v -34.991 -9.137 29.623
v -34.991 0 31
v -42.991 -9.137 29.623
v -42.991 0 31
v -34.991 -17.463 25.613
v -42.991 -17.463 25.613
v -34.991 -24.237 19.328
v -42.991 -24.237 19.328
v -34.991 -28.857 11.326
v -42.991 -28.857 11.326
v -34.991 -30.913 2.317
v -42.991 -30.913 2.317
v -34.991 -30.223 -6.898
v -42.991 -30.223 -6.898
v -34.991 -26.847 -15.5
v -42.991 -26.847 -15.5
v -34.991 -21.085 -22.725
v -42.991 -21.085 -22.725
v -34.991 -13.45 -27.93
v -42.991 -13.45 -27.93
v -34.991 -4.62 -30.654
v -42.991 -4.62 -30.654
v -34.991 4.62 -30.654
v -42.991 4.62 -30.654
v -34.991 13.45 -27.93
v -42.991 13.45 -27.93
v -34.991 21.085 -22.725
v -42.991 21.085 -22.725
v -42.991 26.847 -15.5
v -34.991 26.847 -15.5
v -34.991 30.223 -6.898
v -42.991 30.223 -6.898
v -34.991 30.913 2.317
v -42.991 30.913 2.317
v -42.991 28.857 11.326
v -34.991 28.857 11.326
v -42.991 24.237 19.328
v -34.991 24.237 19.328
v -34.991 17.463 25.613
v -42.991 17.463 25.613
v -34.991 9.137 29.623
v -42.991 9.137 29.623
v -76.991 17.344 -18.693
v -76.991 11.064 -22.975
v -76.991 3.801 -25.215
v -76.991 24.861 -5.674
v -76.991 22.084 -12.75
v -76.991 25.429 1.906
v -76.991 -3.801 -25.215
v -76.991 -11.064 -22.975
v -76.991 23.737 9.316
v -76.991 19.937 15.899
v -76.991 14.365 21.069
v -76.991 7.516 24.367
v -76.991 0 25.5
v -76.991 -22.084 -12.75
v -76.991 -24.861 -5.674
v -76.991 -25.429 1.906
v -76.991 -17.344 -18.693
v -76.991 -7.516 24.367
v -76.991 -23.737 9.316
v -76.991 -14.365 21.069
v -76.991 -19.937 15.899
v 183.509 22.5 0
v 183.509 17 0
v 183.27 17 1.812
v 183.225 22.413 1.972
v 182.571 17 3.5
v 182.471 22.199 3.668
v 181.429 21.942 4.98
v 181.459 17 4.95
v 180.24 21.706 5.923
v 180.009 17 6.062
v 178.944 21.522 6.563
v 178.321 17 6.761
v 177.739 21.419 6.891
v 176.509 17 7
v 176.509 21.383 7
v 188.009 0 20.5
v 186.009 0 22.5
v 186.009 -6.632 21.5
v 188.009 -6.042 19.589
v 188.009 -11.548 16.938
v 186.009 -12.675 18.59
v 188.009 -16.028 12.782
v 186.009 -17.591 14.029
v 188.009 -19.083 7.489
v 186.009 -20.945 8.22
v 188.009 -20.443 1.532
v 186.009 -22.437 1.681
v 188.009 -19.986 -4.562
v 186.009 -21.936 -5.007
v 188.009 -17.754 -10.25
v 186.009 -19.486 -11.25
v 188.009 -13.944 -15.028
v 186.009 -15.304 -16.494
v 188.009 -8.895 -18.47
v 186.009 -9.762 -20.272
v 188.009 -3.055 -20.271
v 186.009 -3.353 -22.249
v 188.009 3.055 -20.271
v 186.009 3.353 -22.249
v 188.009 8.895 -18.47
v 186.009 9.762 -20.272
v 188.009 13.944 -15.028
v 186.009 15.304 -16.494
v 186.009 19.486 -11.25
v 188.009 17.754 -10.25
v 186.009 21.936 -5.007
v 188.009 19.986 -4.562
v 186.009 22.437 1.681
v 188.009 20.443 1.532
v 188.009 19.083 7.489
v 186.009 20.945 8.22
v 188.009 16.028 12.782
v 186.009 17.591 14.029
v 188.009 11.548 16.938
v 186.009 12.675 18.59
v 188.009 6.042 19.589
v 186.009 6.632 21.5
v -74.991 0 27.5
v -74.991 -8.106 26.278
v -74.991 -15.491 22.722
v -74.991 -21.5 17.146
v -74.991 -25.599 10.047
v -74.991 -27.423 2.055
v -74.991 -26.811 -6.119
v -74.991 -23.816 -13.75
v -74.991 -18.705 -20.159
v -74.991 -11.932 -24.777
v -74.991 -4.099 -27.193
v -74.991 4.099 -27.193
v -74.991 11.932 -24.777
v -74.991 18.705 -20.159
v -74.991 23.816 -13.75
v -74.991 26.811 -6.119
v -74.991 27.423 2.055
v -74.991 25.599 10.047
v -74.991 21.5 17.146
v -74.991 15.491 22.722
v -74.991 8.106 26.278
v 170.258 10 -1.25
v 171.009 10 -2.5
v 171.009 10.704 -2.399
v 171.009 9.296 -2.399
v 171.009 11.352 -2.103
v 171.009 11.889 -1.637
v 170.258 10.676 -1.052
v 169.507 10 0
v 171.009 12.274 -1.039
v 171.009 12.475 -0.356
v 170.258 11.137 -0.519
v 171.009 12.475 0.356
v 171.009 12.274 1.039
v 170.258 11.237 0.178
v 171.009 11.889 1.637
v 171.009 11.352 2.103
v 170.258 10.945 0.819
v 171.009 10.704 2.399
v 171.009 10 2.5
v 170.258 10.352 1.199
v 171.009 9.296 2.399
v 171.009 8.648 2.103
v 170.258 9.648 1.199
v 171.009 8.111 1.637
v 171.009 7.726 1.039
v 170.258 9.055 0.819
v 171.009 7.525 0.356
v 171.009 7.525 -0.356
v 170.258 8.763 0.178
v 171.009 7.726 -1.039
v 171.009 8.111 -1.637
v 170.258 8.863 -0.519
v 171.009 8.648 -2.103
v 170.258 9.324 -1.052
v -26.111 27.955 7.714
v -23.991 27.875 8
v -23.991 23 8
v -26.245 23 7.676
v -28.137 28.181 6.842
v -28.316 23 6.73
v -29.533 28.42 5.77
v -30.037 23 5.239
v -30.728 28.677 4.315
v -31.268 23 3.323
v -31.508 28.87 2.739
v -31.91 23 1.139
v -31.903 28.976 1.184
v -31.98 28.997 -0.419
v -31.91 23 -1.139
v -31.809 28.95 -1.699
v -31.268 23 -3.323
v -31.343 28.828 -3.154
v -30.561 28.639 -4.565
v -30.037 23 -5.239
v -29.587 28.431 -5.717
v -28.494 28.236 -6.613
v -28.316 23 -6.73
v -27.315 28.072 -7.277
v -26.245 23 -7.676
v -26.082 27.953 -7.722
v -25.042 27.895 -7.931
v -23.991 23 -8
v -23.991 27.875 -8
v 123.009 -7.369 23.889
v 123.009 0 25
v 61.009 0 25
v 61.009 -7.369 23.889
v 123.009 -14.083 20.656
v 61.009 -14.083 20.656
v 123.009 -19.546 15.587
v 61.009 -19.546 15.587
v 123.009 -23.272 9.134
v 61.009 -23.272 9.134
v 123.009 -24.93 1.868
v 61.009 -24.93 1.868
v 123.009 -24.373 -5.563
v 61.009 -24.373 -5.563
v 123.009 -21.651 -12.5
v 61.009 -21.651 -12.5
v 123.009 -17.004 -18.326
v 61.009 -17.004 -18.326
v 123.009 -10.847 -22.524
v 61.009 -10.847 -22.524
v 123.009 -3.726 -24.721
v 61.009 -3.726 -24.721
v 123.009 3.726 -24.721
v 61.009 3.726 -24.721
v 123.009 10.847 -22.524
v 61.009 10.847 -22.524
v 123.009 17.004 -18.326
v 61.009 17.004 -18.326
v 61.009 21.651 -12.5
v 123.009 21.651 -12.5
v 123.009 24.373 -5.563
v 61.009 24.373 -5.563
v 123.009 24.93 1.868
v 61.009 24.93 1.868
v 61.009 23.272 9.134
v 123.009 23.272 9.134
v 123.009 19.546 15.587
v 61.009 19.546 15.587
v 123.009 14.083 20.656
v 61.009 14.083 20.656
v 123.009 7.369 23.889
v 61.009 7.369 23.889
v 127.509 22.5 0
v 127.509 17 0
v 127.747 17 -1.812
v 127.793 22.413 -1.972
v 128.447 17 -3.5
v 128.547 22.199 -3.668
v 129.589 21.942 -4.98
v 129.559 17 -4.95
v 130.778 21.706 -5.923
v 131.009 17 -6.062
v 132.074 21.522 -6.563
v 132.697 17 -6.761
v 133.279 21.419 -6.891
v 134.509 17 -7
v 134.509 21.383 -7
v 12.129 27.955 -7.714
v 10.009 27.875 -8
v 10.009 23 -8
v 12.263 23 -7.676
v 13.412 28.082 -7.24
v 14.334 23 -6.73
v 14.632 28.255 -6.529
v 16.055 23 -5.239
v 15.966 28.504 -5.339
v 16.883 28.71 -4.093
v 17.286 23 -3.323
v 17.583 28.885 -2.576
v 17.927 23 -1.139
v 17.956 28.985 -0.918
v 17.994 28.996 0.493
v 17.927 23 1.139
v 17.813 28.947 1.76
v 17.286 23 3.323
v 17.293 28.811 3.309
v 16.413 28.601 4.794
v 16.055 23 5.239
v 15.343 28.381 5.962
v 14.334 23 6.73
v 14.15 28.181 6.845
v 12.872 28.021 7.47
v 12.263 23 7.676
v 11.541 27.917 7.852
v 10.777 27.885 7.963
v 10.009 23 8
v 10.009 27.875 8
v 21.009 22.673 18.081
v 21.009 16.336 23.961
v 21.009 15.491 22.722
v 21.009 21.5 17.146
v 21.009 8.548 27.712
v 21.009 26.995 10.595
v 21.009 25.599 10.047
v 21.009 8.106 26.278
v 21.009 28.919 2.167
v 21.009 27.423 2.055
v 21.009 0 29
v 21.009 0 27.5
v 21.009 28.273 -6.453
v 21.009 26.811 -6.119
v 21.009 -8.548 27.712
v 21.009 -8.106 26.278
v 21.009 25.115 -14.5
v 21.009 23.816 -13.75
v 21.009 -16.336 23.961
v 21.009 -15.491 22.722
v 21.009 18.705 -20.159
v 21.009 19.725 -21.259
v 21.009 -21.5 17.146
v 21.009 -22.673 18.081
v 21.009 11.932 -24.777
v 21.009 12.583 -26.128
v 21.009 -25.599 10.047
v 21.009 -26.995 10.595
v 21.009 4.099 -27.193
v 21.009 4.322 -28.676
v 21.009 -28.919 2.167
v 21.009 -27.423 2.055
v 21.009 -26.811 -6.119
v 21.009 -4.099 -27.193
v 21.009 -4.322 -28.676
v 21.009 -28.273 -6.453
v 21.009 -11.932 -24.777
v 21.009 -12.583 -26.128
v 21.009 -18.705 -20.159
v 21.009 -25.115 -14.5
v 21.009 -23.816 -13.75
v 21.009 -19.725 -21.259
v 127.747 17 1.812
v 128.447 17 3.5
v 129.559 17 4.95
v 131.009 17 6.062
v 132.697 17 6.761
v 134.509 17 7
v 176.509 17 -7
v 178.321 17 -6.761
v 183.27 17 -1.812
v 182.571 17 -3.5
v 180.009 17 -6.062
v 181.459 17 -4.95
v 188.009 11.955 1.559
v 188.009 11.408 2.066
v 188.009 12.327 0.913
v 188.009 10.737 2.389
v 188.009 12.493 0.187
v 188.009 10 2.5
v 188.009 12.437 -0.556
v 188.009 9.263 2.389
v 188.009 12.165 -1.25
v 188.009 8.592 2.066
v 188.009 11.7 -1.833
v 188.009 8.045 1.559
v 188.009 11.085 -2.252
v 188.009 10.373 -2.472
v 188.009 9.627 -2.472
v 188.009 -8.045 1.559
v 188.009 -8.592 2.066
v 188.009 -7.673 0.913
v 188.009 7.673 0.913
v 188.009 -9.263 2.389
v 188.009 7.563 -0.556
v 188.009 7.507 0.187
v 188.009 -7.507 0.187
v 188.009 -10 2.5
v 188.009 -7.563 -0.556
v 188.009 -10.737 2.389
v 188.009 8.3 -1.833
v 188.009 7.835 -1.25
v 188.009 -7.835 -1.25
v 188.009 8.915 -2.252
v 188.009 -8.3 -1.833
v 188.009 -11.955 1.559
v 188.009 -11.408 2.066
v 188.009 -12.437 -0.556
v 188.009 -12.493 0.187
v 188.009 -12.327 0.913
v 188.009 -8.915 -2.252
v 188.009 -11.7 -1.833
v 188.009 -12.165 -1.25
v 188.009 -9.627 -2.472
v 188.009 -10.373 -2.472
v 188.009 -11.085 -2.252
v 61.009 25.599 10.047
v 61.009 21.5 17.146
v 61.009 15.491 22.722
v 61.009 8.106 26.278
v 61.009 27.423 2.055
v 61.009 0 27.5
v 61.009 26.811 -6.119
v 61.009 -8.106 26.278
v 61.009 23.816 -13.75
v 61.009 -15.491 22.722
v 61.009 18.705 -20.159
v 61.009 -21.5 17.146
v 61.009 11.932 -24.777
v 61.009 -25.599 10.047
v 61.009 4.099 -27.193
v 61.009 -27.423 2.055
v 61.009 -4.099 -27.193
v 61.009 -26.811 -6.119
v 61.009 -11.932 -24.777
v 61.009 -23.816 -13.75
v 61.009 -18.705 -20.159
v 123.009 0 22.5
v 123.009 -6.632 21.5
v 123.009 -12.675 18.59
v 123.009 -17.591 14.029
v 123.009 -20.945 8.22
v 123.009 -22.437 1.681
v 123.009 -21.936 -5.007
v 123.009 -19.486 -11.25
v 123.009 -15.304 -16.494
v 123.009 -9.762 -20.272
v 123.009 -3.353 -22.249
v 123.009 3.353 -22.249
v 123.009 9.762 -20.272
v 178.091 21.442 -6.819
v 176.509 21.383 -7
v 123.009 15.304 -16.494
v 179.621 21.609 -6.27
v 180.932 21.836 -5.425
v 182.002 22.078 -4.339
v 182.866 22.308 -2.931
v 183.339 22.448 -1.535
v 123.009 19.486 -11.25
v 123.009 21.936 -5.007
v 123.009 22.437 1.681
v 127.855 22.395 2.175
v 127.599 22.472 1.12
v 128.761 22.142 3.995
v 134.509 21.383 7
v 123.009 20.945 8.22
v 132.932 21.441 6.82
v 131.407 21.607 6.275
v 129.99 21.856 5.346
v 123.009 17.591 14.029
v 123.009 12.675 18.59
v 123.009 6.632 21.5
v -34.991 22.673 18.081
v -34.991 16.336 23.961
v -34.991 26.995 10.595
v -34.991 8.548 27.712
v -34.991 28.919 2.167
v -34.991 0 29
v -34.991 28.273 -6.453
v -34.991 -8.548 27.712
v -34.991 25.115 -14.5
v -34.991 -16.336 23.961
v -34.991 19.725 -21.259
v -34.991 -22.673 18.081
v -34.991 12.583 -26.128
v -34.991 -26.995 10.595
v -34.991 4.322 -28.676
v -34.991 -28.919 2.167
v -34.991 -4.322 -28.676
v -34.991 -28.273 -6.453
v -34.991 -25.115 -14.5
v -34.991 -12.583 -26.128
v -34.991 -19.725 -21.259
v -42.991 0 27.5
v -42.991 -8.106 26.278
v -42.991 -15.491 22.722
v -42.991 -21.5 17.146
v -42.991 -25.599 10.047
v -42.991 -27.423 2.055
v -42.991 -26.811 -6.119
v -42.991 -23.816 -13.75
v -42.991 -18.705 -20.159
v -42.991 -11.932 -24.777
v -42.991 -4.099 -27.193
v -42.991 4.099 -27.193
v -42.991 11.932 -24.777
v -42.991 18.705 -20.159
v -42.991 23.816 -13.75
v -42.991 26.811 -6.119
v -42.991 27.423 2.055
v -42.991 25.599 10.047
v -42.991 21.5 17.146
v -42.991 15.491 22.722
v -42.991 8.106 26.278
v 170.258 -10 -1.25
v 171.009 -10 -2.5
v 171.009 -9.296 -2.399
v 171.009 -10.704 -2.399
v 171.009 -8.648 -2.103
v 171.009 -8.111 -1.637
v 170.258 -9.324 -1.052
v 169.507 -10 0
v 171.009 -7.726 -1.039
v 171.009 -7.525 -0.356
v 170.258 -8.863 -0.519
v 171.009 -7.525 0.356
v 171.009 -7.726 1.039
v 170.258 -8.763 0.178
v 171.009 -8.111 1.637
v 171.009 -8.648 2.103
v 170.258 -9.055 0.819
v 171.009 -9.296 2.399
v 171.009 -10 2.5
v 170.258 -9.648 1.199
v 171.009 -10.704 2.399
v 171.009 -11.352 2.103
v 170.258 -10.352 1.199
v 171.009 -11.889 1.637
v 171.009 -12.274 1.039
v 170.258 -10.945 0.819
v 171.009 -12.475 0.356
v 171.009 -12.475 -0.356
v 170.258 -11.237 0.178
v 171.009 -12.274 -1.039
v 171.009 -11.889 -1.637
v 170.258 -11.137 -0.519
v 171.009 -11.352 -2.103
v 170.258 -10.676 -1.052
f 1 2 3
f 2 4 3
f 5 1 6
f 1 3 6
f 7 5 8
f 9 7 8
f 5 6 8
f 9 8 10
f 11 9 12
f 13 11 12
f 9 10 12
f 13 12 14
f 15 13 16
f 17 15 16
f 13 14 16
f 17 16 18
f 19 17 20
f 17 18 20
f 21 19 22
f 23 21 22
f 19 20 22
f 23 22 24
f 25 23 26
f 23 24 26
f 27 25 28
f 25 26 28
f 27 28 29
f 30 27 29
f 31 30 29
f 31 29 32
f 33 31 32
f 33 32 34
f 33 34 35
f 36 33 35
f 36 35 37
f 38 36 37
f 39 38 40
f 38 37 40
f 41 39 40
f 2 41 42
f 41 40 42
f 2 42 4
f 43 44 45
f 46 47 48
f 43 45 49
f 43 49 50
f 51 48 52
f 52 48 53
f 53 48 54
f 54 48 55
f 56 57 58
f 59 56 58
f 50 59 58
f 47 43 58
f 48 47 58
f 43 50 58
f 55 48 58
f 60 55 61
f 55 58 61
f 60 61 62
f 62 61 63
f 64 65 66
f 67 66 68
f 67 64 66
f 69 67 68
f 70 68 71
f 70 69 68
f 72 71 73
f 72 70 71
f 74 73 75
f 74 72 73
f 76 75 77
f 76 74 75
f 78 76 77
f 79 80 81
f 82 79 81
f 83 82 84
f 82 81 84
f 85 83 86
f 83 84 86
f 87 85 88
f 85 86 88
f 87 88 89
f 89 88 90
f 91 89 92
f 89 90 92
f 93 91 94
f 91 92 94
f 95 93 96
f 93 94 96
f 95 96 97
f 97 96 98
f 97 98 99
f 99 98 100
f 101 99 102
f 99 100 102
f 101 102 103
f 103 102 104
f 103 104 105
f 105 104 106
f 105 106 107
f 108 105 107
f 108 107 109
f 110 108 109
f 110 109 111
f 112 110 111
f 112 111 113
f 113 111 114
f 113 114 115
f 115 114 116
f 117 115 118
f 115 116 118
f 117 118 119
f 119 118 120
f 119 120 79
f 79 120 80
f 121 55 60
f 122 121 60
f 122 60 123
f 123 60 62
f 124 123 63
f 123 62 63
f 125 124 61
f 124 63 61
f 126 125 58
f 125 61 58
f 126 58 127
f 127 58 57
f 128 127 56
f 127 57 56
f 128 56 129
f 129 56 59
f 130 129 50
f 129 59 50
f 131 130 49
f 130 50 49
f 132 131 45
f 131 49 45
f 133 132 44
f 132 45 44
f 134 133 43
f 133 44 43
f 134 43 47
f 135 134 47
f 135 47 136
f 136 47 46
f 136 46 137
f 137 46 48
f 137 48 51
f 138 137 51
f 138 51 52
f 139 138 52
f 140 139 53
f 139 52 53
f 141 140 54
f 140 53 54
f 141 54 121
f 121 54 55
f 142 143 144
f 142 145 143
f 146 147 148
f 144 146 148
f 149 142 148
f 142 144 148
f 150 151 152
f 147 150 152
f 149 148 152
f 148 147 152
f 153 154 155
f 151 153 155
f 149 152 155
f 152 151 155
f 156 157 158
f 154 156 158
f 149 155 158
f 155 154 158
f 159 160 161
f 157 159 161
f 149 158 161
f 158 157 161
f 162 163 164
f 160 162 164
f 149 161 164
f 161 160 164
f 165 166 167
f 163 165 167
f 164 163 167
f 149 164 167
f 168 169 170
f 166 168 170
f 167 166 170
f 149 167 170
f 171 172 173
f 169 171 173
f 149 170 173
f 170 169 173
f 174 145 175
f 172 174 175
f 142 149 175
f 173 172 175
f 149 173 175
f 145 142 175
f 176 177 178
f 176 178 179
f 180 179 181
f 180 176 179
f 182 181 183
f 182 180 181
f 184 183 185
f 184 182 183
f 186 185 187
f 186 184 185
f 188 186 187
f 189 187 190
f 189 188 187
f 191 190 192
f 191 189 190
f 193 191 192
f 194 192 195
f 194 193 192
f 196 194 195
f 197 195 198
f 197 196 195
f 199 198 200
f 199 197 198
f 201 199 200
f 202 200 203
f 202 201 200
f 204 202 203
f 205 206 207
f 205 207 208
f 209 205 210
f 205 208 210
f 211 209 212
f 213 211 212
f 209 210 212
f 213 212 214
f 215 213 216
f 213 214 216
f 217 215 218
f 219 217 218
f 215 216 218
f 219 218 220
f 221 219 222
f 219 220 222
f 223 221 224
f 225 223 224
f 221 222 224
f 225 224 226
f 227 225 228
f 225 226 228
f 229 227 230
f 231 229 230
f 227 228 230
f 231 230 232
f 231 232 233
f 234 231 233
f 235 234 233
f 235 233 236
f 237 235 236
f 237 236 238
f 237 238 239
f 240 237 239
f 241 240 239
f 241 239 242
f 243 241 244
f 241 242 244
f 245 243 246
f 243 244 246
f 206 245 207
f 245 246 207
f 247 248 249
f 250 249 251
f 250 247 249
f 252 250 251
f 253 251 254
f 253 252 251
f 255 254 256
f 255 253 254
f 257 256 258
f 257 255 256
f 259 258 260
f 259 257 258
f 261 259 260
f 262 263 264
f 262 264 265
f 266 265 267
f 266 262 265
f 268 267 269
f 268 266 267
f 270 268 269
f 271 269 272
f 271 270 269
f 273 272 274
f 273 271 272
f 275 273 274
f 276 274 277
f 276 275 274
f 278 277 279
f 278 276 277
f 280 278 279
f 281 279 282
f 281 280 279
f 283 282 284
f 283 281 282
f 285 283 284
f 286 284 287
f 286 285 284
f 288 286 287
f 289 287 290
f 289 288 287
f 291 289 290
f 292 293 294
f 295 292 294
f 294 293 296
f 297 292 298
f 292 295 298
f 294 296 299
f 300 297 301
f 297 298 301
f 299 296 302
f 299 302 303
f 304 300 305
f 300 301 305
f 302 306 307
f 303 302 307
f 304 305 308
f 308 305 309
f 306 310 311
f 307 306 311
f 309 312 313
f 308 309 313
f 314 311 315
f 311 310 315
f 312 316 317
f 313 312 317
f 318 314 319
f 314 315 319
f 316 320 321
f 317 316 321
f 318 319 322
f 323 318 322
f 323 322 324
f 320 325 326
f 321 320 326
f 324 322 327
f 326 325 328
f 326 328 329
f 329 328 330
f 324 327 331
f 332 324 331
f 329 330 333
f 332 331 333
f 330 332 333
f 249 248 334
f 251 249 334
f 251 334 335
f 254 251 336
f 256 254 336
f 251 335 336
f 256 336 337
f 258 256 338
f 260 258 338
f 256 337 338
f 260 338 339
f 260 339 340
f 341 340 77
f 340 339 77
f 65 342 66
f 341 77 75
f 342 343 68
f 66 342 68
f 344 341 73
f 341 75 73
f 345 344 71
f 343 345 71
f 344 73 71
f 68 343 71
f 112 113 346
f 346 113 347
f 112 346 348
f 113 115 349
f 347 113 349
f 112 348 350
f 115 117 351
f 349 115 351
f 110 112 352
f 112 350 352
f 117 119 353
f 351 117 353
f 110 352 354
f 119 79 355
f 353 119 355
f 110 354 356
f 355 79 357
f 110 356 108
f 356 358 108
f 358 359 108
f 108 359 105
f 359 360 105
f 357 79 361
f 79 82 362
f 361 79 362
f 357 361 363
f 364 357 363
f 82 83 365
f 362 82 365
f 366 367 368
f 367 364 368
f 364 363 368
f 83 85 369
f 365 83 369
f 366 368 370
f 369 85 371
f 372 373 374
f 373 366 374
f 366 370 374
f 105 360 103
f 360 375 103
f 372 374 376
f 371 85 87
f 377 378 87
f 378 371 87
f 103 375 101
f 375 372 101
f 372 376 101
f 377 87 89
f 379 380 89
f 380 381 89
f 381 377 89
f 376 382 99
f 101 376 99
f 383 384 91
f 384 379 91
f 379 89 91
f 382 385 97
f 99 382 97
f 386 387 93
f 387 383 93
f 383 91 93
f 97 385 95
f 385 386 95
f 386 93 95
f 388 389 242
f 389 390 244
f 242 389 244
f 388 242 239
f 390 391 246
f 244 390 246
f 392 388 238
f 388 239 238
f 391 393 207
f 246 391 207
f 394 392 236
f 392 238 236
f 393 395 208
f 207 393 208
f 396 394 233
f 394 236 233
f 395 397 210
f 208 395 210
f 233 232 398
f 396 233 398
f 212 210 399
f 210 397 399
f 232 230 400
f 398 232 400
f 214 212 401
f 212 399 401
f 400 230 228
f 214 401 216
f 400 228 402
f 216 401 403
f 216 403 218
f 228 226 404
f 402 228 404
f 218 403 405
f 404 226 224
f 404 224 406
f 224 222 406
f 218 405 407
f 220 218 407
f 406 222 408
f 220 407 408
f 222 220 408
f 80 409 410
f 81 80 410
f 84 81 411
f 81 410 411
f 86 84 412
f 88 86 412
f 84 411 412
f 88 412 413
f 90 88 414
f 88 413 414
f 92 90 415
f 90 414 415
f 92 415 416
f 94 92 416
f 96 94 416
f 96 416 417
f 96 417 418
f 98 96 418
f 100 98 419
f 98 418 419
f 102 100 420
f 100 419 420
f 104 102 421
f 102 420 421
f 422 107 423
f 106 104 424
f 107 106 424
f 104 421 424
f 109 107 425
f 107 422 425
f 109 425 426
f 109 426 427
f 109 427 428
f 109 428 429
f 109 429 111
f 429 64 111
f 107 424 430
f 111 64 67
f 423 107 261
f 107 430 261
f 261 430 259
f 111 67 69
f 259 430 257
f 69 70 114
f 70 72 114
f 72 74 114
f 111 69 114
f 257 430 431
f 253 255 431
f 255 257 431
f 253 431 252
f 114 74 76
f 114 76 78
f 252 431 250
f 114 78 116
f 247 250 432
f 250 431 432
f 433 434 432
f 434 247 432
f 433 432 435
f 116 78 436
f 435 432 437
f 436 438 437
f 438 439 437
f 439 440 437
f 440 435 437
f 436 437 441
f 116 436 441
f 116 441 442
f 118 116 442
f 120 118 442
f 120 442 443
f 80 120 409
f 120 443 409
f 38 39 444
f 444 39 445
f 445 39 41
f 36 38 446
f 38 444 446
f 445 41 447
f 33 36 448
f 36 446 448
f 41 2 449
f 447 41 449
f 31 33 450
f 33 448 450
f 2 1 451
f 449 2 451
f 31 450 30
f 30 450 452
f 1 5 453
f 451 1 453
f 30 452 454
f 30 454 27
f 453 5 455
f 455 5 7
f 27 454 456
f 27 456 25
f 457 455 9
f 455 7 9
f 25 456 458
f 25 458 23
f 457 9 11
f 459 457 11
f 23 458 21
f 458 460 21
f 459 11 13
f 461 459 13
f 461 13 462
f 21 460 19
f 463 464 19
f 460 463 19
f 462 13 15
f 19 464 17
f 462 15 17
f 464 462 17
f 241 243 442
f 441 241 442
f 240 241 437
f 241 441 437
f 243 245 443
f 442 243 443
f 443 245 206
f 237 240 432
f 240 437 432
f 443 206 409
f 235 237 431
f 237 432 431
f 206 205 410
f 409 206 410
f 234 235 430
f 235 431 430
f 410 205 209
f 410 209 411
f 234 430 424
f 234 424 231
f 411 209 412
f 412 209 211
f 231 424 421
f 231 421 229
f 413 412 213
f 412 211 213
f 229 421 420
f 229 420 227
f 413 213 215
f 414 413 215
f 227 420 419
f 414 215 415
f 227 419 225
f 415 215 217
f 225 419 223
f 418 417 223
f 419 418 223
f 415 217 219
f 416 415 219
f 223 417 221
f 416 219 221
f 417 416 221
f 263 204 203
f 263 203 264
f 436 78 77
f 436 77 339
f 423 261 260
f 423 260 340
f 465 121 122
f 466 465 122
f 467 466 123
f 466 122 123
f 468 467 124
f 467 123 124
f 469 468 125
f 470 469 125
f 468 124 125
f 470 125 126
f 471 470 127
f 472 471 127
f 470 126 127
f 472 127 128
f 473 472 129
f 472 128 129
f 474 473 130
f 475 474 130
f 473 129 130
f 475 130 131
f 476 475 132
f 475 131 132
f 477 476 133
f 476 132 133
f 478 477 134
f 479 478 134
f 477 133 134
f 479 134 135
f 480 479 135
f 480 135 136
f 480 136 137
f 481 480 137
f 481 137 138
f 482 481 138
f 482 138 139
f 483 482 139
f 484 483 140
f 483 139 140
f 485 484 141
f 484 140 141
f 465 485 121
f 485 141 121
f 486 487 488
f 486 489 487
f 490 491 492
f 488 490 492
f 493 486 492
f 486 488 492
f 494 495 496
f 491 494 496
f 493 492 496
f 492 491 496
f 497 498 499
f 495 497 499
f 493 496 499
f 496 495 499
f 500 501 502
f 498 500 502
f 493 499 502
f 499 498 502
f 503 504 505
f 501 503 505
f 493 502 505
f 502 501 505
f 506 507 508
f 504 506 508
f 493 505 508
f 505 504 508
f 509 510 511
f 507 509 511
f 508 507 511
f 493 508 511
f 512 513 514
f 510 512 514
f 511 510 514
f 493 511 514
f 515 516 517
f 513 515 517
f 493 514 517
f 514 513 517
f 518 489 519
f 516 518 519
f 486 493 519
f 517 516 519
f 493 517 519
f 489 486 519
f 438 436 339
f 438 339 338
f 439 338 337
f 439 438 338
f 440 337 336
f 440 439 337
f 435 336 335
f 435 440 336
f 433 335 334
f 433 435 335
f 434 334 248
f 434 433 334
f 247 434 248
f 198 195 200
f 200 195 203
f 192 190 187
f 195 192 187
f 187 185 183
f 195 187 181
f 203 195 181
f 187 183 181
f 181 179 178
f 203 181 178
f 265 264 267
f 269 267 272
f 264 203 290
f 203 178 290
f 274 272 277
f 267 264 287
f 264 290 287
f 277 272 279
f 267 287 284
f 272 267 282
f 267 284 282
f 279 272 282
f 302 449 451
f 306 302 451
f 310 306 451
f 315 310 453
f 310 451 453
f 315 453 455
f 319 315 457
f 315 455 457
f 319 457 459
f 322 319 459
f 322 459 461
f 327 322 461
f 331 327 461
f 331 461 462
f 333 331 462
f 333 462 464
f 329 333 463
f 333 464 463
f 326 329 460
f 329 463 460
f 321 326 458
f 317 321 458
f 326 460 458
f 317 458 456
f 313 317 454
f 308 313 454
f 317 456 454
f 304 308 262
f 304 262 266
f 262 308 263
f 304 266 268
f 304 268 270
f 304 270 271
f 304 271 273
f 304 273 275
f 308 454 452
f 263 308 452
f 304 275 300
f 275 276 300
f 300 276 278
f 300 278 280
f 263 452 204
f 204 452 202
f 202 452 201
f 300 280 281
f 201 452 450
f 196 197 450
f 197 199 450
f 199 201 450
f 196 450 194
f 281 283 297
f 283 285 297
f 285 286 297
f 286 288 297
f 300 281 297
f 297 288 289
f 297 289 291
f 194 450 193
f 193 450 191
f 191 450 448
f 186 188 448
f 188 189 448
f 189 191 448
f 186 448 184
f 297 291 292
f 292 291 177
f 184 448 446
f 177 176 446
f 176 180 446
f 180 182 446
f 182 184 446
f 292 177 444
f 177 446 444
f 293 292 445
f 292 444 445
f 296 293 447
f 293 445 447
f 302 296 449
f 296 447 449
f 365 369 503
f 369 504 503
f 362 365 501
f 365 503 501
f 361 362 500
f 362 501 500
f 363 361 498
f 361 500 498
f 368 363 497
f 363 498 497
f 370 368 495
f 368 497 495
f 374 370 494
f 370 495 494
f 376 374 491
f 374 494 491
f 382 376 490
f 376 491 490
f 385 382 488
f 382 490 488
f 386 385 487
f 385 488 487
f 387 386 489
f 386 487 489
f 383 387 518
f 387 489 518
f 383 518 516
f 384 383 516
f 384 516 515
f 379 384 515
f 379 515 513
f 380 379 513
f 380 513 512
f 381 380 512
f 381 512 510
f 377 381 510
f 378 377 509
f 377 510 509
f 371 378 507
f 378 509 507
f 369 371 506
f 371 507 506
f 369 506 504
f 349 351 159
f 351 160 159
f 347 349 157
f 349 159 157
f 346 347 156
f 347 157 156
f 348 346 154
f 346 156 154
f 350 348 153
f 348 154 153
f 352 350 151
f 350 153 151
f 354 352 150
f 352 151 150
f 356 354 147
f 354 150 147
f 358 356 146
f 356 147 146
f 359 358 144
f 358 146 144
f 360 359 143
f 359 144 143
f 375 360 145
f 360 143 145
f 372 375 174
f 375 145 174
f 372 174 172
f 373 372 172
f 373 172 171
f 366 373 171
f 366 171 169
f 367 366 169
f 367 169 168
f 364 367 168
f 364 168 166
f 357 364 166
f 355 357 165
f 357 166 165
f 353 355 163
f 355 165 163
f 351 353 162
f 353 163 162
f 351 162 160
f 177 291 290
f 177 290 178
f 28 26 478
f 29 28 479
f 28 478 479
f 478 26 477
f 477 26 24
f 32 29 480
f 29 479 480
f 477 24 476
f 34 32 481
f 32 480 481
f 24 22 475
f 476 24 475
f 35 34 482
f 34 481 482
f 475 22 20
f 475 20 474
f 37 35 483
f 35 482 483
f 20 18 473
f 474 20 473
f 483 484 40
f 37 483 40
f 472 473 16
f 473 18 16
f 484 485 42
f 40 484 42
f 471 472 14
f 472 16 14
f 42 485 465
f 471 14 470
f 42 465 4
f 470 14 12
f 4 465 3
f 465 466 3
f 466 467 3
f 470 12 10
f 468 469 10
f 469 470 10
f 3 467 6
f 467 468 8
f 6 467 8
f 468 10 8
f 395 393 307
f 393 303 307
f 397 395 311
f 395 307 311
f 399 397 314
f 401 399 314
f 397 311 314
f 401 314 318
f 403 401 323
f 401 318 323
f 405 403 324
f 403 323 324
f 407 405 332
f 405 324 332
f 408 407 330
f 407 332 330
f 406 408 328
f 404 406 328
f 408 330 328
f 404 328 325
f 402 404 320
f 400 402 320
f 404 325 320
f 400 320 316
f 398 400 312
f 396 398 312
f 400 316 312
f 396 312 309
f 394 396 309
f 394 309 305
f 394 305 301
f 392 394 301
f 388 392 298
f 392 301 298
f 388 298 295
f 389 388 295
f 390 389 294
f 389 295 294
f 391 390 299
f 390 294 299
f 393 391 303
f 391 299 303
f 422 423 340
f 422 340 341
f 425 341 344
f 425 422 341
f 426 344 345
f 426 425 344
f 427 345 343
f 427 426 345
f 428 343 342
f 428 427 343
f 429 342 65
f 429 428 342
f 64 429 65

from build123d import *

# Parameters (mm, degrees)
CUT_EXTRUDE_1_DEPTH    = 6
CUT_EXTRUDE_2_DEPTH    = 5.5
CHAMFER_1_SIZE         = 2
HOLE_WIZARD_M6_1_D     = 5
HOLE_WIZARD_M6_1_DEPTH = 17
HOLE_WIZARD_M6_1_TIP   = 1.502151548


with BuildPart() as part:
    # 草图1 → 旋转1 (revolve)
    with BuildSketch(Plane.XY, mode=Mode.PRIVATE) as revolve_1_sk:
        Polygon((-76.99110035, 0), (188.00889965, 0), (188.00889965, 22.5), (123.00889965, 22.5), (123.00889965, 25), (61.00889965, 25), (61.00889965, 27.5), (21.00889965, 27.5), (21.00889965, 29), (-34.99110035, 29), (-34.99110035, 31), (-42.99110035, 31), (-42.99110035, 27.5), (-76.99110035, 27.5), align=None)
    revolve(revolve_1_sk.sketch.rotate(Axis((-104.076979444, 0, 0), (1, 0, 0)), 90), axis=Axis((-104.076979444, 0, 0), (1, 0, 0)))

    # 草图2 → 切除-拉伸1 (cut)
    with BuildSketch(Plane(origin=(0, 29, 0), x_dir=(-1, 0, 0), z_dir=(0, 1, 0))):
        with BuildLine():
            Line((23.99110035, -8), (-10.00889965, -8))
            ThreePointArc((-10.00889965, -8), (-18.00889965, 0), (-10.00889965, 8))
            Line((-10.00889965, 8), (23.99110035, 8))
            ThreePointArc((23.99110035, 8), (31.99110035, 0), (23.99110035, -8))
        make_face()
    extrude(amount=-CUT_EXTRUDE_1_DEPTH, mode=Mode.SUBTRACT)

    # 草图3 → 切除-拉伸2 (cut)
    with BuildSketch(Plane(origin=(0, 22.5, 0), x_dir=(-1, 0, 0), z_dir=(0, 1, 0))):
        with BuildLine():
            Line((-176.50889965, 7), (-134.50889965, 7))
            ThreePointArc((-134.50889965, 7), (-129.559152182, 4.949747468), (-127.50889965, 0))
            ThreePointArc((-127.50889965, 0), (-129.559152182, -4.949747468), (-134.50889965, -7))
            Line((-134.50889965, -7), (-176.50889965, -7))
            ThreePointArc((-176.50889965, -7), (-181.458647118, -4.949747468), (-183.50889965, 0))
            ThreePointArc((-183.50889965, 0), (-181.458647118, 4.949747468), (-176.50889965, 7))
        make_face()
    extrude(amount=-CUT_EXTRUDE_2_DEPTH, mode=Mode.SUBTRACT)

    # 倒角1
    chamfer_1_edges = [part.edges().sort_by_distance(p)[0] for p in [
        (188.00889965, 0, -22.5),
        (-76.99110035, 0, -27.5),
    ]]
    chamfer(chamfer_1_edges, length=CHAMFER_1_SIZE)

    # M6 螺纹孔1
    with Locations(Plane(origin=(188.00889965, 0, 0), x_dir=(0, 0, -1), z_dir=(1, 0, 0))):
        with Locations((0, 10), (0, -10)):
            Hole(HOLE_WIZARD_M6_1_D / 2, depth=HOLE_WIZARD_M6_1_DEPTH)
            with Locations((0, 0, -(HOLE_WIZARD_M6_1_DEPTH + HOLE_WIZARD_M6_1_TIP / 2))):  # 118° drill point
                Cone(0, HOLE_WIZARD_M6_1_D / 2, HOLE_WIZARD_M6_1_TIP, mode=Mode.SUBTRACT)


solid = part.part
